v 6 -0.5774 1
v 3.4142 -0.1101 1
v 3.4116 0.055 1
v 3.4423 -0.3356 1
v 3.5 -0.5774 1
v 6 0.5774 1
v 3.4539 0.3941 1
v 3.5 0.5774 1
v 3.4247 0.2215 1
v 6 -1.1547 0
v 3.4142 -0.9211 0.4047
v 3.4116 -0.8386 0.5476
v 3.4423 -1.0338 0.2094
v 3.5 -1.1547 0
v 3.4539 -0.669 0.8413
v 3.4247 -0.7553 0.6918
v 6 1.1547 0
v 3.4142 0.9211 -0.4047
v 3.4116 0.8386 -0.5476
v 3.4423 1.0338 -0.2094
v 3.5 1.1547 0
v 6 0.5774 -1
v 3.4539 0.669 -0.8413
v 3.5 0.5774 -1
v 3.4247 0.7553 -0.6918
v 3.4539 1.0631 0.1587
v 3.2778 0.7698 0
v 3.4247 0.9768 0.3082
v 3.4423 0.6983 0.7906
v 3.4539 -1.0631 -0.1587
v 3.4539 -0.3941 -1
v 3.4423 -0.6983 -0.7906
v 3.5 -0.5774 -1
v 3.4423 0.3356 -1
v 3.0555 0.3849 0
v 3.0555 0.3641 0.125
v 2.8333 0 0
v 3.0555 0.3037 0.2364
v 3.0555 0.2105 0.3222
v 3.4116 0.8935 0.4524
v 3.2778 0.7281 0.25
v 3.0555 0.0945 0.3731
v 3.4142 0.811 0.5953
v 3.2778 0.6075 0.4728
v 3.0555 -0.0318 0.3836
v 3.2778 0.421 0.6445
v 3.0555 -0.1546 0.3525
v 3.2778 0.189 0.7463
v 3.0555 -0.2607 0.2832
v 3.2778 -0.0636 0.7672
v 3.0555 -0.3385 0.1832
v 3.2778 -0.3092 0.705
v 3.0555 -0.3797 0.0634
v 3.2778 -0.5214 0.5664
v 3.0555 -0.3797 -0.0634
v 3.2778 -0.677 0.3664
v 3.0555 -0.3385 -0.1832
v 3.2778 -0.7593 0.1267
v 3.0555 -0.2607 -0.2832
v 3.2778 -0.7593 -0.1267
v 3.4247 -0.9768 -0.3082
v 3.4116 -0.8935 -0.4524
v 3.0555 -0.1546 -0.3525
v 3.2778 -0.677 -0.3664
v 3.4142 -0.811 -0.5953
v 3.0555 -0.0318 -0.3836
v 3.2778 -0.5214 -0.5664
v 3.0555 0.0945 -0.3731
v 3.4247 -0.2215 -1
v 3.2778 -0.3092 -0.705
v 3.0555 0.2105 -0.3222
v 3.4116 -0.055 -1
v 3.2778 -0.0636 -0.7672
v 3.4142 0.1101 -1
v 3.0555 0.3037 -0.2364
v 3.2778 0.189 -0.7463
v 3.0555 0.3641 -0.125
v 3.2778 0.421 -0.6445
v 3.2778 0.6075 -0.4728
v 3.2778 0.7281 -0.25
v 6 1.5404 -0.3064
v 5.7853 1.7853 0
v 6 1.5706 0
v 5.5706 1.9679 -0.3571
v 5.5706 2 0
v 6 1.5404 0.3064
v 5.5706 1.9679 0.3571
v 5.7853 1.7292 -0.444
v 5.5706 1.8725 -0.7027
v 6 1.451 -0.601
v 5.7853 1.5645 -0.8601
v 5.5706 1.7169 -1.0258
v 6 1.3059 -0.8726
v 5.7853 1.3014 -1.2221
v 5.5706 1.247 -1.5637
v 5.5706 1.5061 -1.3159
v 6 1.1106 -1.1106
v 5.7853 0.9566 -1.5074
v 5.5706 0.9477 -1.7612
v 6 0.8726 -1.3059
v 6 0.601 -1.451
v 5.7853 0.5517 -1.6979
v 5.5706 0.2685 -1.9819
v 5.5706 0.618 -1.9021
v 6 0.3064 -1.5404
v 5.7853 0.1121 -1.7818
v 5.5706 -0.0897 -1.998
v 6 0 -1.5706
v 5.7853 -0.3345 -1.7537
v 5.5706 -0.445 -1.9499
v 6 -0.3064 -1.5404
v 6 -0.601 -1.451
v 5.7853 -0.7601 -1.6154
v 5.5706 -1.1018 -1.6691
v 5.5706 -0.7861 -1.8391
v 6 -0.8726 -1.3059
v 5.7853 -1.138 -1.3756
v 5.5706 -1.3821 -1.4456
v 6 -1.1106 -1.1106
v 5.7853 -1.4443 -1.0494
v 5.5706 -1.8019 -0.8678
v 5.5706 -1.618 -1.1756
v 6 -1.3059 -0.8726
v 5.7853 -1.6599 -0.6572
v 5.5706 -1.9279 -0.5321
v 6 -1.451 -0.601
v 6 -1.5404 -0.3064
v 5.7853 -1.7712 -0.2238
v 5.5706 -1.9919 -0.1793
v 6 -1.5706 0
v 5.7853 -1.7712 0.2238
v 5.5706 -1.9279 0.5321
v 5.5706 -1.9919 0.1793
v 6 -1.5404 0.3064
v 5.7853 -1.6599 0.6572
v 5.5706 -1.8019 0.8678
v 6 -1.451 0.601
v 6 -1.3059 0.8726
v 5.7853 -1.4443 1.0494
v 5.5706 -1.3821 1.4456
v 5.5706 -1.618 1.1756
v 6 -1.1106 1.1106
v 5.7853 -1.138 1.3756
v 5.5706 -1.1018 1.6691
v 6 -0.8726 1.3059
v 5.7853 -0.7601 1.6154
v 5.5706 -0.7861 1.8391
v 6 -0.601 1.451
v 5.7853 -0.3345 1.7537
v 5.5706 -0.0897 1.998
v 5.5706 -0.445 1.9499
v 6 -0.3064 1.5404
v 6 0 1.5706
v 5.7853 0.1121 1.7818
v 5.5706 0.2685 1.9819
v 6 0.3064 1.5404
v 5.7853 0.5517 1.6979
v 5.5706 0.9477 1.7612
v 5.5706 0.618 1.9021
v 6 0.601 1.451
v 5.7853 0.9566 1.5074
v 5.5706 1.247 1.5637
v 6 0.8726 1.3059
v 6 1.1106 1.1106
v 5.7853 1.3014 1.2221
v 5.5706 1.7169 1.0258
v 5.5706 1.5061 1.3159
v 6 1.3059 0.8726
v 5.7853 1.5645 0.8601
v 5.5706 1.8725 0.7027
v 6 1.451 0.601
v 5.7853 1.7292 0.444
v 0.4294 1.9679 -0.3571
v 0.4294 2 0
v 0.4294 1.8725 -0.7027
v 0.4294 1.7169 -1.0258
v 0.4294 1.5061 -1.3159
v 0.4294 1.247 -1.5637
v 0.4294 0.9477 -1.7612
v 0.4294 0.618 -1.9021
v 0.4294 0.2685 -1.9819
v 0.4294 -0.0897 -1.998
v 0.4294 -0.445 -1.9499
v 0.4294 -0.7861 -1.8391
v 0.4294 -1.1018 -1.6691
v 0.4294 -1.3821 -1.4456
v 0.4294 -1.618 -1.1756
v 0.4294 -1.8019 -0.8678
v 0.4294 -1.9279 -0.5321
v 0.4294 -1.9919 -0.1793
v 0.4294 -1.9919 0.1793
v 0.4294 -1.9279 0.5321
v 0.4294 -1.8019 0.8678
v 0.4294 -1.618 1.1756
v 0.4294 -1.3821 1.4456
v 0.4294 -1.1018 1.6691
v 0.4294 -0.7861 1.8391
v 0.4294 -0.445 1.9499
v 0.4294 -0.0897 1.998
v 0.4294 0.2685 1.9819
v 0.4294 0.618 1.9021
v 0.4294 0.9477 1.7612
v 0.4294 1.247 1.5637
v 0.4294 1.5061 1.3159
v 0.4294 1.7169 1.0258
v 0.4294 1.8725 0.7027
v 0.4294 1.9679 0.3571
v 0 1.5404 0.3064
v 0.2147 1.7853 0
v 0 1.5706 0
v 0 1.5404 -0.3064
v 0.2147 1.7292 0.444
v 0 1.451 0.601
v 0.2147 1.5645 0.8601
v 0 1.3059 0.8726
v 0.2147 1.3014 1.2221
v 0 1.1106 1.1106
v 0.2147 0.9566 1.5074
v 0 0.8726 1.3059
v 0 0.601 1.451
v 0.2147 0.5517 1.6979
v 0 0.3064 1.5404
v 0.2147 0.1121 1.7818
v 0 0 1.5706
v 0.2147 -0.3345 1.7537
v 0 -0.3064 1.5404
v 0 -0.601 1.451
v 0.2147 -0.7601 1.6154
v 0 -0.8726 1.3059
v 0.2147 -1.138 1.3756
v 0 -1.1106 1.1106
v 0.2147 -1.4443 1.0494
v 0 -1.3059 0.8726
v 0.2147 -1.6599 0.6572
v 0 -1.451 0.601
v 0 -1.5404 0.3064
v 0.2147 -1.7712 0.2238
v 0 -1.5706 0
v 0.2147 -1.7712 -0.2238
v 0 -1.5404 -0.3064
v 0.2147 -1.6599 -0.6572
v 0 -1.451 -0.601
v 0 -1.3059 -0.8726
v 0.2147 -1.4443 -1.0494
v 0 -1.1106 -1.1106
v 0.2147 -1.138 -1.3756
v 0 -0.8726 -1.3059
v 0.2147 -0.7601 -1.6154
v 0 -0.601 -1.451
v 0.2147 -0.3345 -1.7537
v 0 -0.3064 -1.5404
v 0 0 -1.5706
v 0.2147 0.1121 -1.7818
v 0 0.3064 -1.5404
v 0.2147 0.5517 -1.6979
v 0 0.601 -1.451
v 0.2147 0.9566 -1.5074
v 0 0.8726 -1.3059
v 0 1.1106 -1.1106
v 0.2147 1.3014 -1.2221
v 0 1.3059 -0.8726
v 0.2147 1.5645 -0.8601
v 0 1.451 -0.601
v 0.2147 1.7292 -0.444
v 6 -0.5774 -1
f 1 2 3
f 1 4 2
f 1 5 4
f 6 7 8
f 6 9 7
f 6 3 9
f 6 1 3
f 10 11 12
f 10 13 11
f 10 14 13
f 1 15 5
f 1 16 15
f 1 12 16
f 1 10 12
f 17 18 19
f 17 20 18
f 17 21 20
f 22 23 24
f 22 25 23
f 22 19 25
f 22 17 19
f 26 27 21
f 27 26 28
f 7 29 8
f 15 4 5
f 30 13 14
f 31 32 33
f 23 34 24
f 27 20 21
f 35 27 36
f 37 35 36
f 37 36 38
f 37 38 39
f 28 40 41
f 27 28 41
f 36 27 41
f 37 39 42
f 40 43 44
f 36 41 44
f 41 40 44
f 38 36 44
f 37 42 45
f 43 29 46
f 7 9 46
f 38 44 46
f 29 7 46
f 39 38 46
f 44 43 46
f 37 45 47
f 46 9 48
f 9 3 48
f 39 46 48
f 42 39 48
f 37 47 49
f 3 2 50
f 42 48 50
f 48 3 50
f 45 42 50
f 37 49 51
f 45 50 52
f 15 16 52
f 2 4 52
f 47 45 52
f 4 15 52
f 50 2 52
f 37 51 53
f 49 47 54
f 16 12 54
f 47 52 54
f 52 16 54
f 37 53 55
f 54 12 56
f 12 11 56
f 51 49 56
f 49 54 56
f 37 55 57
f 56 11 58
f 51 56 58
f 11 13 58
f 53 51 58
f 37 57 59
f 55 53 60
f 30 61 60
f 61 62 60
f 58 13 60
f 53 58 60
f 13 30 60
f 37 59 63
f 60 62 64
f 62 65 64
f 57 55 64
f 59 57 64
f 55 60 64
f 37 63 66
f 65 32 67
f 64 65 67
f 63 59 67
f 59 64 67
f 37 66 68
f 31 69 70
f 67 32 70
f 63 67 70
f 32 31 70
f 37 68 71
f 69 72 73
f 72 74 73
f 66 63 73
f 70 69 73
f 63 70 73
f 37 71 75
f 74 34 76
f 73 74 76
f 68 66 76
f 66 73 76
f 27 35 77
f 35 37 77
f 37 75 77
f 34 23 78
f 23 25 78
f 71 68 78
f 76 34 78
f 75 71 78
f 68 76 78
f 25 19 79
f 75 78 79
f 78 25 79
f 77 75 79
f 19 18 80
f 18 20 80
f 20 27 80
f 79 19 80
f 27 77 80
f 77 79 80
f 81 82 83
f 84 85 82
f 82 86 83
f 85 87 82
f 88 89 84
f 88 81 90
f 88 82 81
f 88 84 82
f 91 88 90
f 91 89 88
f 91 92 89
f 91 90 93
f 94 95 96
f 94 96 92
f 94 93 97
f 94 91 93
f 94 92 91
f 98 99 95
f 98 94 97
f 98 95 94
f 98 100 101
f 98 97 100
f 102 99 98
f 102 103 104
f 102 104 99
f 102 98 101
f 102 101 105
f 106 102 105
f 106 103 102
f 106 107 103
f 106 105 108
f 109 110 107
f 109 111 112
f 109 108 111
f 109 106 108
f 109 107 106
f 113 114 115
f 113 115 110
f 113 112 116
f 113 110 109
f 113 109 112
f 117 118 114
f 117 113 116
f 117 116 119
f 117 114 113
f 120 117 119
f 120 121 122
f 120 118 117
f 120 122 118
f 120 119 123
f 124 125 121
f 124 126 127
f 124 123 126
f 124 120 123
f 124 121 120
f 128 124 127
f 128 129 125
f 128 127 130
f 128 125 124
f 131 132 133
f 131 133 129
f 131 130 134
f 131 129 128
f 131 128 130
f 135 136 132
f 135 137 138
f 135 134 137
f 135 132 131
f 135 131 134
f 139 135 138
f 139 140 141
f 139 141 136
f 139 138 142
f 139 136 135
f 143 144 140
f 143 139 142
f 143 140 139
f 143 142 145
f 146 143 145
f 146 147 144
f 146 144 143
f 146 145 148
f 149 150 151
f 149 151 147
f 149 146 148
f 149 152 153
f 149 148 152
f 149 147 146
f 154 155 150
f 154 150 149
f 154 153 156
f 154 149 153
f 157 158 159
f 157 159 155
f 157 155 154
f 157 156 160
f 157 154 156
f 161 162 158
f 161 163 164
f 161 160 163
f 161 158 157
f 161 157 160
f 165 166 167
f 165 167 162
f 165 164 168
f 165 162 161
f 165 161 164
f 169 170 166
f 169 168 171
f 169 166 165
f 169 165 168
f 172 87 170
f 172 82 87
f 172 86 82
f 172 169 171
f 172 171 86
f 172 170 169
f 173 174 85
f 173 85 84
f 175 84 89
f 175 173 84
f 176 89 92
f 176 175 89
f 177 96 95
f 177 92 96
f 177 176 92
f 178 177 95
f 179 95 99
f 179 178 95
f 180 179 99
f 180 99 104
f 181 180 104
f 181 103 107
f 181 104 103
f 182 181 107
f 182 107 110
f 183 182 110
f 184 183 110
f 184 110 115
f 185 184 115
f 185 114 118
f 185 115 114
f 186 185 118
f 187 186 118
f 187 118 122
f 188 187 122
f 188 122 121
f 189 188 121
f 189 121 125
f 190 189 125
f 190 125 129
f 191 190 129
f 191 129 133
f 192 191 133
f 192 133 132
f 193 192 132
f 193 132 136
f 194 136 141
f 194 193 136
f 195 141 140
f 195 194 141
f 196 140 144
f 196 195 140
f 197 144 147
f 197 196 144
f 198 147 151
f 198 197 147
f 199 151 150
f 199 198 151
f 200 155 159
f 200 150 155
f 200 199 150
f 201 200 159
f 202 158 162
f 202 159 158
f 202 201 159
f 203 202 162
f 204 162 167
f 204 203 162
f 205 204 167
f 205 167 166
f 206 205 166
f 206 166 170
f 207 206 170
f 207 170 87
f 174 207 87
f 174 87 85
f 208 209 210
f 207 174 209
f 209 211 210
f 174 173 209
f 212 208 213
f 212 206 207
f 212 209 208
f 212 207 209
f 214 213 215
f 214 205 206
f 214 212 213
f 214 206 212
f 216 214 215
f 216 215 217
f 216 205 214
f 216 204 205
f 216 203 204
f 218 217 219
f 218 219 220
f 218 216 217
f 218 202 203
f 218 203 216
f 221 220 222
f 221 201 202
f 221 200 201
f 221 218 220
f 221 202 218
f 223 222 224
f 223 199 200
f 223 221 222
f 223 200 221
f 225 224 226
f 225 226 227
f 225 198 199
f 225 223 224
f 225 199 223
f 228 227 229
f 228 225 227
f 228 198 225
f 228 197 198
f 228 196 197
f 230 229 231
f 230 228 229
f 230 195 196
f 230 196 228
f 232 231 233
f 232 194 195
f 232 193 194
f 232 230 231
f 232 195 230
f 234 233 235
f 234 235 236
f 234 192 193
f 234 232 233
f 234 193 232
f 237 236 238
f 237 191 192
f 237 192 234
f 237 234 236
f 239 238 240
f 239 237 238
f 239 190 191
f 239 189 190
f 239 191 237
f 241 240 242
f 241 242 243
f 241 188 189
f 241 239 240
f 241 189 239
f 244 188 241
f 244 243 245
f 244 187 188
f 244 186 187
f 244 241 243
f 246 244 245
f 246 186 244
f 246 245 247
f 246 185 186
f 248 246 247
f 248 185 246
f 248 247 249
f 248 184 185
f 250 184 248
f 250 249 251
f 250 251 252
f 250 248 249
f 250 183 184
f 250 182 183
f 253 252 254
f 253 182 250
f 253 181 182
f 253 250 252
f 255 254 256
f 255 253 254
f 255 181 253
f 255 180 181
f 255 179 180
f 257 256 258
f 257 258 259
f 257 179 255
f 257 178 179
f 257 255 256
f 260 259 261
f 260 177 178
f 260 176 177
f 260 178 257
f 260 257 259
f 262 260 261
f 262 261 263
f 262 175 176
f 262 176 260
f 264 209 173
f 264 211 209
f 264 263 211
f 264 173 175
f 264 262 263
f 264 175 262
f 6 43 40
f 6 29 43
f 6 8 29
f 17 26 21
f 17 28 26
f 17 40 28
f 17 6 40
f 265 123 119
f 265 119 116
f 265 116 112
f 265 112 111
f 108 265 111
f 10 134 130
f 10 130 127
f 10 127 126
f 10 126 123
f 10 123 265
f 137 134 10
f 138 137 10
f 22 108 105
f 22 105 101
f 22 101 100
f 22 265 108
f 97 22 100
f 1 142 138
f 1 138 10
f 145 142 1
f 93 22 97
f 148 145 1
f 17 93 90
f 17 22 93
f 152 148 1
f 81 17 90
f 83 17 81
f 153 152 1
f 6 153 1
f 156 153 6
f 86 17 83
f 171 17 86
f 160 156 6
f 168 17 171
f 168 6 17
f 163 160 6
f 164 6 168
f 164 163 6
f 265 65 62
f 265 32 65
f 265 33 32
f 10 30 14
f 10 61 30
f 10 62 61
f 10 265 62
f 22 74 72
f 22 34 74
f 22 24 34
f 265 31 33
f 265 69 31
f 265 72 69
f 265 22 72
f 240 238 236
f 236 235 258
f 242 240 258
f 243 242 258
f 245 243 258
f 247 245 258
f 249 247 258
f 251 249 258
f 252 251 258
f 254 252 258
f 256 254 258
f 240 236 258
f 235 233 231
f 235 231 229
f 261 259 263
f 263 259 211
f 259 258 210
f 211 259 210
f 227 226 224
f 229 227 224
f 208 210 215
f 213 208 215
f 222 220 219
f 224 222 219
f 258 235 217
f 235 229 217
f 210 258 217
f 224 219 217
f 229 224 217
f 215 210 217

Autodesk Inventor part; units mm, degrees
ref_plane "YZ Plane" through (0, 0, 0) normal (1, 0, 0) x (0, 1, 0)
ref_plane "XZ Plane" through (0, 0, 0) normal (0, 1, 0) x (-1, 0, 0)
sketch "Skizze1" plane through (0, 0, 0) normal (0, 0, 1) x (1, 0, 0)
  line L0 (0, 0) -> (2.8333, 0)
  line L1 (6, 1.1547) -> (6, 2)
  line L2 (6, 2) -> (0, 2)
  line L3 (6, 1.1547) -> (3.5, 1.1547)
  line L4 (3.5, 1.1547) -> (2.8333, 0)
  line L5 (0, -0.4) -> (0, 2.4) projected
  line L6 (0, 2) -> (0, 0)
  dimension "d0" = 2.5
  dimension "d1" = 60
  dimension "d2" = 4
  dimension "d3" = 2.3094
  dimension "d5" = 6
revolve "Körper" add sketch "Skizze1" angle 360 about axis through (0, 0, 0) along (1, 0, 0)
sketch "Skizze2" plane through (6, 0, 0) normal (1, 0, 0) x (0, 1, 0)
  circle A0 centre (0, 0) radius 1.1547 projected
  line L0 (-0.5774, 1) -> (0.5774, 1)
  line L1 (0.5774, 1) -> (1.1547, 0)
  line L2 (1.1547, 0) -> (0.5774, -1)
  line L3 (0.5774, -1) -> (-0.5774, -1)
  line L4 (-0.5774, -1) -> (-1.1547, 0)
  line L5 (-1.1547, 0) -> (-0.5774, 1)
  point P0 (0, 0)
  point P1 (0, 0)
extrude "Loch" add sketch "Skizze2" against normal up to next contours L1 A0 | A0 L2 | L0 A0 | A0 L3 | L5 A0 | A0 L4
thread "Gewinde" size "M4x0.7" class "6g" standard "ISO Metric profile" length 6
chamfer "Fase1" distance 0.4294 angle 45 1 edges at (6, -2, 0) measured on face at (4, 1.9935, -0.1609)
chamfer "Fase2" distance 0.4294 angle 45 1 edges at (0, -2, 0) measured on face at (1.8569, 1.9935, -0.1609)
ref_plane "Work Plane1" through (3, 0, 0) normal (0, 0, 1) x (1, 0, 0)
equation "\"d0\" = INTI"
equation "\"d2\" = NND"
equation "\"d3\" = 1.1547 * SW"
equation "\"d5\" = NLG"
equation "\"d8\" = NLG"
equation "\"d10\" = -0.5 * GD1 + 0.5 * NND"
equation "\"d11\" = FAWI"
equation "\"d34\" = -0.5 * GD1 + 0.5 * NND"
equation "\"d12\" = -0.5 * GD1 + 0.5 * NND"
equation "\"d13\" = FAWI"
equation "\"d35\" = -0.5 * GD1 + 0.5 * NND"
equation "\"NND\" = 4"
equation "\"NLG\" = 6"
equation "\"INTI\" = 2.5"
equation "\"FAWI\" = 45deg"
equation "\"SW\" = 2"
equation "\"GD1\" = THREADDIA - 1.2269 * PTC"
equation "\"SPD\" = 2.5"
equation "\"GUL\" = 0.61345 * PTC"
equation "\"TOA\" = 30deg"
equation "\"THREADDIA\" = 4"
equation "\"PTC\" = 0.7"
equation "\"FAWI1\" = 45deg"
equation "\"GAL\" = 0.61345 * PTC"
equation "\"E0\" = 1.155 * SW"
properties part number "DIN 913 - M4 x 6" material "Stahl, weich"
